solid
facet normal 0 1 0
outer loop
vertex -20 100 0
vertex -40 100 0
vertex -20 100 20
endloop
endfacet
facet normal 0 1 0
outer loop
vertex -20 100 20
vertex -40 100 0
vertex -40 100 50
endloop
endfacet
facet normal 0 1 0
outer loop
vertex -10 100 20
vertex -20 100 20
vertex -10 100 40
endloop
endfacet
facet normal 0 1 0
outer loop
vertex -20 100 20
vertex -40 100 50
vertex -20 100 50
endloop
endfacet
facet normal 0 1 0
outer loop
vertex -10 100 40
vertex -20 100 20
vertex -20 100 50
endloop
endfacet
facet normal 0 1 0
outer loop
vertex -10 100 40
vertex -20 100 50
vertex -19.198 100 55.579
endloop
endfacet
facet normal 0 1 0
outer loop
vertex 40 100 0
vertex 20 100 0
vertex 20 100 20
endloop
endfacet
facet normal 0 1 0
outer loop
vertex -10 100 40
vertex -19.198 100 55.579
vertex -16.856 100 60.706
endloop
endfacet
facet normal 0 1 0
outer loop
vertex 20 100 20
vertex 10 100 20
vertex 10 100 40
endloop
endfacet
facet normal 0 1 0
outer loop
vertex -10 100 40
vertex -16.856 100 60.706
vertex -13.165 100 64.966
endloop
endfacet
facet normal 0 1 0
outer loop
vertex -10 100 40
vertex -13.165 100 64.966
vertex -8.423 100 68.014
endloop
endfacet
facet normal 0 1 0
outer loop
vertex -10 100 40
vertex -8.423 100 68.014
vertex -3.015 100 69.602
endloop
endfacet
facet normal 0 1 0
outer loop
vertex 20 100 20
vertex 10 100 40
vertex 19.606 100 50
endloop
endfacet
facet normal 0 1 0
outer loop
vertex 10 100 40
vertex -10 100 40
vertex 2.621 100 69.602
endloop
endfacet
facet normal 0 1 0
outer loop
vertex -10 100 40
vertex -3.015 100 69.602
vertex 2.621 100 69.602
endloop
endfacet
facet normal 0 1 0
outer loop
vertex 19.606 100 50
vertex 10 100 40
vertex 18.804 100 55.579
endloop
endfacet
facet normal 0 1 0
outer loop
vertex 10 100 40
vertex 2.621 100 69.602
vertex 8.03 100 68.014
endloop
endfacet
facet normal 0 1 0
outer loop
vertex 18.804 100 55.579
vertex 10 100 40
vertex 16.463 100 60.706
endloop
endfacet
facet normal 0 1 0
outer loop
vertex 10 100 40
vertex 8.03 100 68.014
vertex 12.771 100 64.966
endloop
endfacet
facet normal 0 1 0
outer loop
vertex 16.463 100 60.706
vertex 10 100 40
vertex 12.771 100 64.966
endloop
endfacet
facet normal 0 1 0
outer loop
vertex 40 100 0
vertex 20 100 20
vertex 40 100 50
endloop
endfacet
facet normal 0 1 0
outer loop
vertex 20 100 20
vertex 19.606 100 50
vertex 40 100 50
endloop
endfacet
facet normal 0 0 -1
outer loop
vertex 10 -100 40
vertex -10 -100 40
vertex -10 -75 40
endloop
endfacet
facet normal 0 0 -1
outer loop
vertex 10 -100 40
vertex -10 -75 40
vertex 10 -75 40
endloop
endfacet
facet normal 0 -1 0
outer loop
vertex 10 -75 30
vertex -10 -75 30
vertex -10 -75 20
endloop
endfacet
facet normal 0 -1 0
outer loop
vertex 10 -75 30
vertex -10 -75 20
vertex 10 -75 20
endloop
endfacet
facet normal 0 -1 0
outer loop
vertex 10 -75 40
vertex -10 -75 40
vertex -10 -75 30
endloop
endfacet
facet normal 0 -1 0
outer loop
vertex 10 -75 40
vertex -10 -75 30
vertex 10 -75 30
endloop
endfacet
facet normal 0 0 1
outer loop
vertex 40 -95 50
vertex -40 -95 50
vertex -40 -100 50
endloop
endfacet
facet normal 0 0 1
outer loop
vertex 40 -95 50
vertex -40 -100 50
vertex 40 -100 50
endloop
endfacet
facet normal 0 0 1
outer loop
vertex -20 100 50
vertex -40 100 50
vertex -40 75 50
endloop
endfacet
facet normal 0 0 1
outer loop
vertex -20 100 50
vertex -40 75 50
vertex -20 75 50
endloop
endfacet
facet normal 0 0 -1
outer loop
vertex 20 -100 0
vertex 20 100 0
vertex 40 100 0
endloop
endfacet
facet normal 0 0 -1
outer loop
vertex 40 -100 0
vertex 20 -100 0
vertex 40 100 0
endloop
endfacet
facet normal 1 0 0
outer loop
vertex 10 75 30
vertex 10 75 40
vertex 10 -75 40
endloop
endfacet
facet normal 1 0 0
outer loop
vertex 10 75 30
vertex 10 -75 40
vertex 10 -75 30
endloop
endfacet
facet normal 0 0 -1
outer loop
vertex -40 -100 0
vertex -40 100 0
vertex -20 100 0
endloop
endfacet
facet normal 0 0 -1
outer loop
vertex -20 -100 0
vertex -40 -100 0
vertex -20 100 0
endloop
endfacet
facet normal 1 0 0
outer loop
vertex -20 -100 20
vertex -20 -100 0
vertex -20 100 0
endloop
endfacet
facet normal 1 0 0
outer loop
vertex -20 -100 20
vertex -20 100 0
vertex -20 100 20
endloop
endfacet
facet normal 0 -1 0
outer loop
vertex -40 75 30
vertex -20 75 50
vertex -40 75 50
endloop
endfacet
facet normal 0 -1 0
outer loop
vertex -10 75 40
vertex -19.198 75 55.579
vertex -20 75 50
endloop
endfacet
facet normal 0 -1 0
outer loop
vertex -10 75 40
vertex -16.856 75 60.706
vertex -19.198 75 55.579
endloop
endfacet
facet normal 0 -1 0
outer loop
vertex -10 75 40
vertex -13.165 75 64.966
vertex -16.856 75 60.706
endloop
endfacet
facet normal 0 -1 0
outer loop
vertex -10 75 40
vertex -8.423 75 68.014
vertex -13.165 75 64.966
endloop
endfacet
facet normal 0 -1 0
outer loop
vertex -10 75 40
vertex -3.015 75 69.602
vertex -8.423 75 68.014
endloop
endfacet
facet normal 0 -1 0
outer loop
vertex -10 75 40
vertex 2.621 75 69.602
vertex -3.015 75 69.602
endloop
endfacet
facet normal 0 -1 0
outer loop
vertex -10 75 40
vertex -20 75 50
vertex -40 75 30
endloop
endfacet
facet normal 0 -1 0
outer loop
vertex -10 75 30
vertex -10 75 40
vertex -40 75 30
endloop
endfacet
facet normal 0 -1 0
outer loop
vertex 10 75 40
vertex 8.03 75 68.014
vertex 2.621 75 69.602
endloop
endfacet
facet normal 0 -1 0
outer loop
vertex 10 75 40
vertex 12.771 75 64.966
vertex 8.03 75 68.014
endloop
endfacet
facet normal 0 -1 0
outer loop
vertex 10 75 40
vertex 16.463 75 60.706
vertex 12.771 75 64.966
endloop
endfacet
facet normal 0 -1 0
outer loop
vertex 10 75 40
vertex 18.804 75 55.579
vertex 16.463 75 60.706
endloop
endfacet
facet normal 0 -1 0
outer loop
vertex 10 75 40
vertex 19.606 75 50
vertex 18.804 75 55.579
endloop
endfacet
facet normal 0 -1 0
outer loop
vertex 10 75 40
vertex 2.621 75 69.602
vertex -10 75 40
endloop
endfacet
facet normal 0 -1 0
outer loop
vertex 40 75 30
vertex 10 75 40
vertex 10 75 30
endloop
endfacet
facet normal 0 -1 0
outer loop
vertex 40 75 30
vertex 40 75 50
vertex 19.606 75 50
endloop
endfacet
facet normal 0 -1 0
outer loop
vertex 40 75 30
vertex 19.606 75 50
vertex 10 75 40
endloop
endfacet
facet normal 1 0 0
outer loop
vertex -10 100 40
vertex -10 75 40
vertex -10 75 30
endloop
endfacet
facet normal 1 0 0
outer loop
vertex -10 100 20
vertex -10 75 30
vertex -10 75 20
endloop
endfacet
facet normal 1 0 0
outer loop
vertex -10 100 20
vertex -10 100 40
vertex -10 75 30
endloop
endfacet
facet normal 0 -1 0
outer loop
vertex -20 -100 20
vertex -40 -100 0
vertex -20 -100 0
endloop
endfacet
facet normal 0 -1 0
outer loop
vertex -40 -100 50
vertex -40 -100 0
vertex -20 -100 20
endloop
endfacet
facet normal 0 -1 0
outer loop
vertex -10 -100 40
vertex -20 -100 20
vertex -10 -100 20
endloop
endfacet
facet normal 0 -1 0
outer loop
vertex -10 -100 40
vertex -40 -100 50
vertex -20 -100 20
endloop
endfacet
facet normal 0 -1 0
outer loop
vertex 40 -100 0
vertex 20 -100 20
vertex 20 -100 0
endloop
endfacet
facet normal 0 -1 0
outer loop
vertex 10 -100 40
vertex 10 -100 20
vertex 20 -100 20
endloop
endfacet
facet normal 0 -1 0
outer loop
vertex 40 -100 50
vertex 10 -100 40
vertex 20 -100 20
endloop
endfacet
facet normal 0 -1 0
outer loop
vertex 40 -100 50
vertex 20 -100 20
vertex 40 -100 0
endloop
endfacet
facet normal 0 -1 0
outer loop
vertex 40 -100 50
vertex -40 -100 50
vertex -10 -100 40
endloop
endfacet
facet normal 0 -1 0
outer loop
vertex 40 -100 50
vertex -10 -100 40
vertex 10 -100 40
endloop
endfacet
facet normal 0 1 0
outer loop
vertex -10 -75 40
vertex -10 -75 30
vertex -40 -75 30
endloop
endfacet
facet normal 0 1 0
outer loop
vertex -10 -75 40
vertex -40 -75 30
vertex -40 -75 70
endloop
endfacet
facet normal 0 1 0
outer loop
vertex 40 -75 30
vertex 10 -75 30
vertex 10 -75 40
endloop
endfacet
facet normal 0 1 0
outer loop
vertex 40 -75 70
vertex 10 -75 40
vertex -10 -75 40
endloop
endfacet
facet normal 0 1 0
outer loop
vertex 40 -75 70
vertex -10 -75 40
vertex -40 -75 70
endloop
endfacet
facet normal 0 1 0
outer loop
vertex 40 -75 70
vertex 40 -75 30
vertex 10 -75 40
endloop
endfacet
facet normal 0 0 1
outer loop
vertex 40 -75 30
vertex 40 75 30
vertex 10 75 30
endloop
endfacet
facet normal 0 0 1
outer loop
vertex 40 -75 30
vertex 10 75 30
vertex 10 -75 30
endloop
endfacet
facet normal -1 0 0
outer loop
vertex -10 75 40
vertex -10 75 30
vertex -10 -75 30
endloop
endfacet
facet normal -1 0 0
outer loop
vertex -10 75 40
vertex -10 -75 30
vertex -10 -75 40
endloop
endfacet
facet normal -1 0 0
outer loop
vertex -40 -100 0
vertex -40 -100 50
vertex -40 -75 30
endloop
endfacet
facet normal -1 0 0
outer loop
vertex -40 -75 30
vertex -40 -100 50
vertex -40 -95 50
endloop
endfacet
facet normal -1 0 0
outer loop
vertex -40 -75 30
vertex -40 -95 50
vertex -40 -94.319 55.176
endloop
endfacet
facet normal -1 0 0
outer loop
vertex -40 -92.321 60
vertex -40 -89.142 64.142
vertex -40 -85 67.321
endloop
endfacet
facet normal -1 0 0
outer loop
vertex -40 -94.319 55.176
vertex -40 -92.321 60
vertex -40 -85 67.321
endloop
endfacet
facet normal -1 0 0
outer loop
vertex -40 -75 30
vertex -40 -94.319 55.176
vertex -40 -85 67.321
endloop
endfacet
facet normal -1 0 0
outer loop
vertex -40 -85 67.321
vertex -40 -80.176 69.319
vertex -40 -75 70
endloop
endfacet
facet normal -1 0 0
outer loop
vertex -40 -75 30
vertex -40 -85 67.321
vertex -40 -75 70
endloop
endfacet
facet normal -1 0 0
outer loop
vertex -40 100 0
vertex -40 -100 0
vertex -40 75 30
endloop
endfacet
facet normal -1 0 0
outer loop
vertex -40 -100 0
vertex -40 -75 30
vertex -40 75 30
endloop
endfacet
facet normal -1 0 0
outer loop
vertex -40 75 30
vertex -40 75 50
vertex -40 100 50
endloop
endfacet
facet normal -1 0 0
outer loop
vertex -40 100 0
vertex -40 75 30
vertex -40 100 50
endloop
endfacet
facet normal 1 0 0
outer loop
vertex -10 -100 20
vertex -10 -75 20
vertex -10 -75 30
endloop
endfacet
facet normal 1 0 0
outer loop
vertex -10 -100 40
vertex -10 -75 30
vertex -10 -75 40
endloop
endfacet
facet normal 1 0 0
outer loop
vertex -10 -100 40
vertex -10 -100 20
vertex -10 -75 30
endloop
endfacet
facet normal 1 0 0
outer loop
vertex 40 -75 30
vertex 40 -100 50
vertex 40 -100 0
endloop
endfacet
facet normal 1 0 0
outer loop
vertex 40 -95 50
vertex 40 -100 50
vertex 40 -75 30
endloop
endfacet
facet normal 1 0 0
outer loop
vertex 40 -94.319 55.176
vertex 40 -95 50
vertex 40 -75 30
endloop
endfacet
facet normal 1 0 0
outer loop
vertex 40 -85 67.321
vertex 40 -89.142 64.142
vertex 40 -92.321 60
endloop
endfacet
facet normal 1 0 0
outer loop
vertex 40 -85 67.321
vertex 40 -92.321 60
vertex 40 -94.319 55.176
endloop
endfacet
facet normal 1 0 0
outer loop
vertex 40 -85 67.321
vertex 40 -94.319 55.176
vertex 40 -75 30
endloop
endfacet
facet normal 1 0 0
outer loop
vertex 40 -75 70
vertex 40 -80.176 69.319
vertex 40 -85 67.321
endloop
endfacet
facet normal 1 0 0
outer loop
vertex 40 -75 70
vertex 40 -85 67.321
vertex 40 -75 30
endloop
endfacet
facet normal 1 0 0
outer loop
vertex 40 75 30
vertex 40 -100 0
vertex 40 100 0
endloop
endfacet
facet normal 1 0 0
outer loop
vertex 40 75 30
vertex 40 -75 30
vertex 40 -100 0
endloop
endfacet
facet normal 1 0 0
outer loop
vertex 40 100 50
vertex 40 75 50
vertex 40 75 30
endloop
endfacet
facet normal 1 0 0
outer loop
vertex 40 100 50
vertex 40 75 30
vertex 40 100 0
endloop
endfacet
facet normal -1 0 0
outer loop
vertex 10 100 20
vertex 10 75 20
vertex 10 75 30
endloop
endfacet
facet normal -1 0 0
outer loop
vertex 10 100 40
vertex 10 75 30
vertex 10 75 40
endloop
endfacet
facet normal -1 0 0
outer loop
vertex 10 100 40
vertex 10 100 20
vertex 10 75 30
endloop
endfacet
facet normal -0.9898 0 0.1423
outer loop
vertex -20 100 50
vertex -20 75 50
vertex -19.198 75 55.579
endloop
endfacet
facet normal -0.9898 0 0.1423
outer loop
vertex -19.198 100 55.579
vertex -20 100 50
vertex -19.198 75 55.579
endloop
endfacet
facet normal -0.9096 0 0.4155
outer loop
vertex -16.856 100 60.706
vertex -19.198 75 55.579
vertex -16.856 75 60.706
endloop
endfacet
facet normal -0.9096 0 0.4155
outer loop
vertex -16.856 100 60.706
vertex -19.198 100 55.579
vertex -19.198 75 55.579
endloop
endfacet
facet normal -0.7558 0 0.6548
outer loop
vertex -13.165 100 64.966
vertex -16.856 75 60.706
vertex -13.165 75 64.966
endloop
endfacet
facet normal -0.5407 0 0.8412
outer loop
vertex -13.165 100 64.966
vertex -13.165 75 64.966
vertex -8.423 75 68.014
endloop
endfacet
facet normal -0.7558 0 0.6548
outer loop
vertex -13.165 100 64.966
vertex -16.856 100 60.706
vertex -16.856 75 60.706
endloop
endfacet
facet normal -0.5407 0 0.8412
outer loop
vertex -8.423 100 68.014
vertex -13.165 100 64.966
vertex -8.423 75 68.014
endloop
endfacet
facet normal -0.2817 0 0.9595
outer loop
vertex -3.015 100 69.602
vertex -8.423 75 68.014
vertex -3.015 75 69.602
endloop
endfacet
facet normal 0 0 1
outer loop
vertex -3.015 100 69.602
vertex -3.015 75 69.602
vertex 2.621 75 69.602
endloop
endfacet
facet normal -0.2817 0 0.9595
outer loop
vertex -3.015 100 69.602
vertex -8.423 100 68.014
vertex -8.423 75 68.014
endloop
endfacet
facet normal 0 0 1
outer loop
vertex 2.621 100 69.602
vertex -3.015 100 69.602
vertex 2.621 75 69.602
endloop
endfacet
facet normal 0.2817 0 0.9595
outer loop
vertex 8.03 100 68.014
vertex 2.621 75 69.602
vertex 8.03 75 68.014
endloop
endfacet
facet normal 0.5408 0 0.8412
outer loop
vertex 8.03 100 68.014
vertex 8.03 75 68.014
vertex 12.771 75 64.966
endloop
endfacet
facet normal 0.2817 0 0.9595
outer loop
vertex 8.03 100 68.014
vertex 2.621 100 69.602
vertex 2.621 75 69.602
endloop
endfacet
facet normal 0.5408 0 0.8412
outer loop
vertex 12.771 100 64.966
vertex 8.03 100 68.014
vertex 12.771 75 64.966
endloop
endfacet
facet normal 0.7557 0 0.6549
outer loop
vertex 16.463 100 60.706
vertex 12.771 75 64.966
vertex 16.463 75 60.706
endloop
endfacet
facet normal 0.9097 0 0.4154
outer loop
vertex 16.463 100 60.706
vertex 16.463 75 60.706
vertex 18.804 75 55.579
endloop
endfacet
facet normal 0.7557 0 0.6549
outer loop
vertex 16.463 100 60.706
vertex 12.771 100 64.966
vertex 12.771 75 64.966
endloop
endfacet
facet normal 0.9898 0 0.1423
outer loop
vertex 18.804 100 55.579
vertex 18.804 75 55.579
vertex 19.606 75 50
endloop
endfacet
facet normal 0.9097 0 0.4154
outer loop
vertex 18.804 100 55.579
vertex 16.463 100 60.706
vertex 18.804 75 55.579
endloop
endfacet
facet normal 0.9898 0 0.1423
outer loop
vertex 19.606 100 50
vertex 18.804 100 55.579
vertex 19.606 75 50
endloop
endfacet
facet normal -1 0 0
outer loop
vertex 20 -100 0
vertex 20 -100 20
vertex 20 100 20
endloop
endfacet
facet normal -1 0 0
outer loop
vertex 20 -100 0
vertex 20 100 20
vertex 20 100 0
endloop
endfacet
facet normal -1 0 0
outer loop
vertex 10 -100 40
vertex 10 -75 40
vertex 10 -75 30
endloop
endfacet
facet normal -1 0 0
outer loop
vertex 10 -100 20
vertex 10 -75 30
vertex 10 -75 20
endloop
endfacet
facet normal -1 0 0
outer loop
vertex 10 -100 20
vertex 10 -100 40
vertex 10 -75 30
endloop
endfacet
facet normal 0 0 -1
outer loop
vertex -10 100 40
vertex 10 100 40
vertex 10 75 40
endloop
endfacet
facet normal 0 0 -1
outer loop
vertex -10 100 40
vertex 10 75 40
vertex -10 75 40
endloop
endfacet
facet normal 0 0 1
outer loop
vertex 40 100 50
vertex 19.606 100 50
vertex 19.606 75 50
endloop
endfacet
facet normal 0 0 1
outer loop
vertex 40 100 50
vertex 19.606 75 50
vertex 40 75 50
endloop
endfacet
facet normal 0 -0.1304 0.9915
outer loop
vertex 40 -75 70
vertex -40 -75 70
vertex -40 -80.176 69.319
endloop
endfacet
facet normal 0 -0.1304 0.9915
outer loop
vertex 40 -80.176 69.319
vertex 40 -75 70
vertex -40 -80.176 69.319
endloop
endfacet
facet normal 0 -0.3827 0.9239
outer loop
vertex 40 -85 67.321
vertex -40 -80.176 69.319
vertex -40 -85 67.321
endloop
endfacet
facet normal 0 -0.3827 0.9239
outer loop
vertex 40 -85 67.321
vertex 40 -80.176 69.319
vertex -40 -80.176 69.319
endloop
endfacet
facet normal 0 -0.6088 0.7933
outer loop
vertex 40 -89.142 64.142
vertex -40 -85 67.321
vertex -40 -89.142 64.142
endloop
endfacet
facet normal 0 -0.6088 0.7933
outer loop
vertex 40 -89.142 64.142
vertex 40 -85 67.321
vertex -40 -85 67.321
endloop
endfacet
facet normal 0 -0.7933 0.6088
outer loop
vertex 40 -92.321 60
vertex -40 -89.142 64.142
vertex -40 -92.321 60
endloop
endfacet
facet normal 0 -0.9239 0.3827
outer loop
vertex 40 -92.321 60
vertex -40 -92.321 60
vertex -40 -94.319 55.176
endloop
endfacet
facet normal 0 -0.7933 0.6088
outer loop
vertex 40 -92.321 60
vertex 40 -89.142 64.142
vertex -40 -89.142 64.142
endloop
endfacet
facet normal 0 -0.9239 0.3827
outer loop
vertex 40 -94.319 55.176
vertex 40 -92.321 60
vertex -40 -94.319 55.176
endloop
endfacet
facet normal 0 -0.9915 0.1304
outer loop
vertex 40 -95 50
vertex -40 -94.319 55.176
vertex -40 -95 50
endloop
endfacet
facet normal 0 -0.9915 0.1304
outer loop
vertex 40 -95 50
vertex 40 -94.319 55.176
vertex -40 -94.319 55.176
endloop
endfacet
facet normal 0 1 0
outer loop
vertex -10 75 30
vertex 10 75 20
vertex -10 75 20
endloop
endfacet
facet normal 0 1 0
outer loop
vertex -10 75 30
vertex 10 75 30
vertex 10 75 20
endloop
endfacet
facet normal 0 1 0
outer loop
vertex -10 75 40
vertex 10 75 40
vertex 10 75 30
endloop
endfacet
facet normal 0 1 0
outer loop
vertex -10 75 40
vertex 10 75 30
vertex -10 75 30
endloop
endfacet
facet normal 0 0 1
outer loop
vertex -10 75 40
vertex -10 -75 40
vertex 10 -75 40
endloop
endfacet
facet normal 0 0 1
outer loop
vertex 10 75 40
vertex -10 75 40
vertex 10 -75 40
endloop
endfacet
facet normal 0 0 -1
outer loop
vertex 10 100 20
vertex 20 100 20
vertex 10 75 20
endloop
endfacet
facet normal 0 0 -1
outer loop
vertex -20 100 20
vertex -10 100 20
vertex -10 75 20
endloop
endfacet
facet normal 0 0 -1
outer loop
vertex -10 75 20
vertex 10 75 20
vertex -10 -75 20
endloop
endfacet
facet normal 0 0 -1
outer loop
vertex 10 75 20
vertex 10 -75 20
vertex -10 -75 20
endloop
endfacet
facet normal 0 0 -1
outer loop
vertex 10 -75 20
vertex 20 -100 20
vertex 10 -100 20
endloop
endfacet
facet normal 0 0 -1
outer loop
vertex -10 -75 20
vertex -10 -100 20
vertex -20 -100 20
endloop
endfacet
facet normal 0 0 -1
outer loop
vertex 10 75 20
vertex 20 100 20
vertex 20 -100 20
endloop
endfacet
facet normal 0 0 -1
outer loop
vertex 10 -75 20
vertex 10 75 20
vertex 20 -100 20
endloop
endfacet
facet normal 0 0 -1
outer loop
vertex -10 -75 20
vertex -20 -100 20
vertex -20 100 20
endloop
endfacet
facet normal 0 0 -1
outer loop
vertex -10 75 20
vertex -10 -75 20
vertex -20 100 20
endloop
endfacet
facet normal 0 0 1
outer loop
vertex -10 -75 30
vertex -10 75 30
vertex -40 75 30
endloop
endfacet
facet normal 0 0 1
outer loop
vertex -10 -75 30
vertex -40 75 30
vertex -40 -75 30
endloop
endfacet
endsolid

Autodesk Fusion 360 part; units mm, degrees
sketch "Sketch1" plane through (0, 0, 0) normal (0, 0, 1) x (1, 0, 0) in component "box"
  line L0 (40, 100) -> (-40, 100)
  line L1 (-40, 100) -> (-40, -100)
  line L2 (-40, -100) -> (40, -100)
  line L3 (40, -100) -> (40, 100)
  line L4 (40, 100) -> (-40, -100) construction
  line L5 (-40, 100) -> (40, -100) construction
  dimension "d1" = 80
  dimension "d2" = 200
extrude "Extrude1" add sketch "Sketch1" along normal blind 50 in component "box"
sketch "Sketch2" plane through (0, -100, 0) normal (0, -1, 0) x (1, 0, 0) in component "box"
  line L0 (-40, 0) -> (40, 0)
  line L1 (40, 0) -> (40, 50)
  line L2 (40, 50) -> (-40, 50)
  line L3 (-40, 50) -> (-40, 0)
  line L4 (20, 0) -> (-20, 0)
  line L5 (-20, 0) -> (-20, 20)
  line L6 (-20, 20) -> (20, 20)
  line L7 (20, 20) -> (20, 0)
  line L8 (20, 0) -> (-20, 20) construction
  line L9 (-20, 0) -> (20, 20) construction
  point P0 (0, 10)
extrude "Extrude2" cut sketch "Sketch2" against normal blind 200 contours L0 L4 L5 L6 L7 in component "box"
sketch "Sketch3" plane through (0, -100, 0) normal (0, -1, 0) x (1, 0, 0) in component "box"
  line L0 (20, 20) -> (20, 0)
  line L1 (20, 0) -> (40, 0)
  line L2 (40, 0) -> (40, 50)
  line L3 (40, 50) -> (-40, 50)
  line L4 (-40, 50) -> (-40, 0)
  line L5 (-40, 0) -> (-20, 0)
  line L6 (-20, 0) -> (-20, 20)
  line L7 (-20, 20) -> (20, 20)
  line L8 (10, 20) -> (-10, 20)
  line L9 (-10, 20) -> (-10, 40)
  line L10 (-10, 40) -> (10, 40)
  line L11 (10, 40) -> (10, 20)
  line L12 (10, 20) -> (-10, 40) construction
  line L13 (-10, 20) -> (10, 40) construction
  point P0 (0, 30)
sketch "Sketch4" plane through (40, 0, 0) normal (1, 0, 0) x (0, 1, 0) in component "box"
  line L0 (-100, 0) -> (100, 0)
  line L1 (100, 0) -> (100, 50)
  line L2 (100, 50) -> (-100, 50)
  line L3 (-100, 50) -> (-100, 0)
  line L4 (75, 30) -> (-75, 30)
  line L5 (-75, 30) -> (-75, 50)
  line L6 (-75, 50) -> (75, 50)
  line L7 (75, 50) -> (75, 30)
  line L8 (75, 30) -> (-75, 50) construction
  line L9 (-75, 30) -> (75, 50) construction
  point P0 (0, 40)
extrude "Extrude3" cut sketch "Sketch4" against normal blind 80 contours L2 L4 L5 L6 L7 in component "box"
extrude "Extrude4" add sketch "Sketch3" against normal blind 200 contours L7 L8 L9 L10 L11 in component "box"
sketch "Sketch5" plane through (0, -100, 0) normal (0, -1, 0) x (1, 0, 0) in component "box"
  line L0 (-20, 20) -> (20, 20)
  line L1 (20, 20) -> (20, 0)
  line L2 (20, 0) -> (40, 0)
  line L3 (40, 0) -> (40, 50)
  line L4 (40, 50) -> (-40, 50)
  line L5 (-40, 50) -> (-40, 0)
  line L6 (-40, 0) -> (-20, 0)
  line L7 (-20, 0) -> (-20, 20)
  line L8 (10, 20) -> (-10, 20)
  line L9 (-10, 20) -> (-10, 40)
  line L10 (-10, 40) -> (10, 40)
  line L11 (10, 40) -> (10, 20)
  line L12 (10, 20) -> (-10, 40) construction
  line L13 (-10, 20) -> (10, 40) construction
  point P0 (0, 30)
extrude "Extrude5" cut sketch "Sketch5" against normal blind 25 contours L0 L8 L9 L10 L11 in component "box"
sketch "Sketch6" plane through (0, 100, 0) normal (0, 1, 0) x (-1, 0, 0) in component "box"
  line L0 (-20, 20) -> (20, 20)
  line L1 (20, 20) -> (20, 0)
  line L2 (20, 0) -> (40, 0)
  line L3 (40, 0) -> (40, 50)
  line L4 (40, 50) -> (-40, 50)
  line L5 (-40, 50) -> (-40, 0)
  line L6 (-40, 0) -> (-20, 0)
  line L7 (-20, 0) -> (-20, 20)
  line L8 (10, 20) -> (-10, 20)
  line L9 (-10, 20) -> (-10, 40)
  line L10 (-10, 40) -> (10, 40)
  line L11 (10, 40) -> (10, 20)
  line L12 (10, 20) -> (-10, 40) construction
  line L13 (-10, 20) -> (10, 40) construction
  point P0 (0, 30)
extrude "Extrude6" cut sketch "Sketch6" against normal blind 25 contours L0 L8 L9 L10 L11 in component "box"
sketch "Sketch7" plane through (40, 0, 0) normal (1, 0, 0) x (0, 1, 0) in component "box"
  line L0 (75, 50) -> (75, 30)
  line L1 (75, 30) -> (-75, 30)
  line L2 (-75, 30) -> (-75, 50)
  line L3 (-75, 50) -> (-100, 50)
  line L4 (-100, 50) -> (-100, 0)
  line L5 (-100, 0) -> (100, 0)
  line L6 (100, 0) -> (100, 50)
  line L7 (100, 50) -> (75, 50)
  circle A0 centre (-75, 50) radius 20
extrude "Extrude7" add sketch "Sketch7" against normal blind 80 contours L2 L3 A0 picked at (-86.5147, 56.648) in component "box"
sketch "Sketch8" plane through (0, 100, 0) normal (0, 1, 0) x (-1, 0, 0) in component "box"
  line L0 (10, 40) -> (10, 20)
  line L1 (10, 20) -> (20, 20)
  line L2 (20, 20) -> (20, 0)
  line L3 (20, 0) -> (40, 0)
  line L4 (40, 0) -> (40, 50)
  line L5 (40, 50) -> (-40, 50)
  line L6 (-40, 50) -> (-40, 0)
  line L7 (-40, 0) -> (-20, 0)
  line L8 (-20, 0) -> (-20, 20)
  line L9 (-20, 20) -> (-10, 20)
  line L10 (-10, 20) -> (-10, 40)
  line L11 (-10, 40) -> (10, 40)
  circle A0 centre (0.1969, 50) radius 19.8031
extrude "Extrude8" add sketch "Sketch8" against normal blind 25 contours L5 A0 in component "box"
sketch "Sketch9" plane through (40, 0, 0) normal (1, 0, 0) x (0, 1, 0) in component "box"
  line L0 (75, 50) -> (75, 30)
  line L1 (75, 30) -> (-75, 30)
  arc A0 (-75, 30) -> (-95, 50) centre (-75, 50) ccw
  line L2 (-95, 50) -> (-100, 50)
  line L3 (-100, 50) -> (-100, 0)
  line L4 (-100, 0) -> (100, 0)
  line L5 (100, 0) -> (100, 50)
  line L6 (100, 50) -> (75, 50)
  line L7 (75, 30) -> (-75, 30)
  line L8 (-75, 30) -> (-75, 70)
  line L9 (-75, 70) -> (75, 70)
  line L10 (75, 70) -> (75, 30)
  line L11 (75, 30) -> (-75, 70) construction
  line L12 (-75, 30) -> (75, 70) construction
  point P0 (0, 50)
extrude "Extrude9" cut sketch "Sketch9" against normal blind 80 contours A0 L8 in component "box"
sketch "Sketch10" plane through (0, -100, 0) normal (0, -1, 0) x (1, 0, 0) in component "box"
  line L0 (10, 40) -> (10, 20)
  line L1 (10, 20) -> (20, 20)
  line L2 (20, 20) -> (20, 0)
  line L3 (20, 0) -> (40, 0)
  line L4 (40, 0) -> (40, 50)
  line L5 (40, 50) -> (-40, 50)
  line L6 (-40, 50) -> (-40, 0)
  line L7 (-40, 0) -> (-20, 0)
  line L8 (-20, 0) -> (-20, 20)
  line L9 (-20, 20) -> (-10, 20)
  line L10 (-10, 20) -> (-10, 40)
  line L11 (-10, 40) -> (10, 40)
  line L12 (10, 20) -> (-10, 20)
  line L13 (-10, 20) -> (-10, 40)
  line L14 (-10, 40) -> (10, 40)
  line L15 (10, 40) -> (10, 20)
  line L16 (10, 20) -> (-10, 40) construction
  line L17 (-10, 20) -> (10, 40) construction
  point P0 (0, 30)
extrude "Extrude10" add sketch "Sketch10" against normal blind 50 contours L0 L10 L11 L12 L13 L14 L15 in component "box"
sketch "Sketch11" plane through (0, -100, 0) normal (0, -1, 0) x (1, 0, 0) in component "box"
  line L0 (-20, 20) -> (20, 20)
  line L1 (20, 20) -> (20, 0)
  line L2 (20, 0) -> (40, 0)
  line L3 (40, 0) -> (40, 50)
  line L4 (40, 50) -> (-40, 50)
  line L5 (-40, 50) -> (-40, 0)
  line L6 (-40, 0) -> (-20, 0)
  line L7 (-20, 0) -> (-20, 20)
  line L8 (10, 20) -> (-10, 20)
  line L9 (-10, 20) -> (-10, 40)
  line L10 (-10, 40) -> (10, 40)
  line L11 (10, 40) -> (10, 20)
  line L12 (10, 20) -> (-10, 40) construction
  line L13 (-10, 20) -> (10, 40) construction
  point P0 (0, 30)
extrude "Extrude11" cut sketch "Sketch11" against normal blind 25 contours L0 L8 L9 L10 L11 in component "box"
component "box" placed x (1, 0, 0) y (0, 1, 0) z (0, 0, 1) at (0, 0, 0)
